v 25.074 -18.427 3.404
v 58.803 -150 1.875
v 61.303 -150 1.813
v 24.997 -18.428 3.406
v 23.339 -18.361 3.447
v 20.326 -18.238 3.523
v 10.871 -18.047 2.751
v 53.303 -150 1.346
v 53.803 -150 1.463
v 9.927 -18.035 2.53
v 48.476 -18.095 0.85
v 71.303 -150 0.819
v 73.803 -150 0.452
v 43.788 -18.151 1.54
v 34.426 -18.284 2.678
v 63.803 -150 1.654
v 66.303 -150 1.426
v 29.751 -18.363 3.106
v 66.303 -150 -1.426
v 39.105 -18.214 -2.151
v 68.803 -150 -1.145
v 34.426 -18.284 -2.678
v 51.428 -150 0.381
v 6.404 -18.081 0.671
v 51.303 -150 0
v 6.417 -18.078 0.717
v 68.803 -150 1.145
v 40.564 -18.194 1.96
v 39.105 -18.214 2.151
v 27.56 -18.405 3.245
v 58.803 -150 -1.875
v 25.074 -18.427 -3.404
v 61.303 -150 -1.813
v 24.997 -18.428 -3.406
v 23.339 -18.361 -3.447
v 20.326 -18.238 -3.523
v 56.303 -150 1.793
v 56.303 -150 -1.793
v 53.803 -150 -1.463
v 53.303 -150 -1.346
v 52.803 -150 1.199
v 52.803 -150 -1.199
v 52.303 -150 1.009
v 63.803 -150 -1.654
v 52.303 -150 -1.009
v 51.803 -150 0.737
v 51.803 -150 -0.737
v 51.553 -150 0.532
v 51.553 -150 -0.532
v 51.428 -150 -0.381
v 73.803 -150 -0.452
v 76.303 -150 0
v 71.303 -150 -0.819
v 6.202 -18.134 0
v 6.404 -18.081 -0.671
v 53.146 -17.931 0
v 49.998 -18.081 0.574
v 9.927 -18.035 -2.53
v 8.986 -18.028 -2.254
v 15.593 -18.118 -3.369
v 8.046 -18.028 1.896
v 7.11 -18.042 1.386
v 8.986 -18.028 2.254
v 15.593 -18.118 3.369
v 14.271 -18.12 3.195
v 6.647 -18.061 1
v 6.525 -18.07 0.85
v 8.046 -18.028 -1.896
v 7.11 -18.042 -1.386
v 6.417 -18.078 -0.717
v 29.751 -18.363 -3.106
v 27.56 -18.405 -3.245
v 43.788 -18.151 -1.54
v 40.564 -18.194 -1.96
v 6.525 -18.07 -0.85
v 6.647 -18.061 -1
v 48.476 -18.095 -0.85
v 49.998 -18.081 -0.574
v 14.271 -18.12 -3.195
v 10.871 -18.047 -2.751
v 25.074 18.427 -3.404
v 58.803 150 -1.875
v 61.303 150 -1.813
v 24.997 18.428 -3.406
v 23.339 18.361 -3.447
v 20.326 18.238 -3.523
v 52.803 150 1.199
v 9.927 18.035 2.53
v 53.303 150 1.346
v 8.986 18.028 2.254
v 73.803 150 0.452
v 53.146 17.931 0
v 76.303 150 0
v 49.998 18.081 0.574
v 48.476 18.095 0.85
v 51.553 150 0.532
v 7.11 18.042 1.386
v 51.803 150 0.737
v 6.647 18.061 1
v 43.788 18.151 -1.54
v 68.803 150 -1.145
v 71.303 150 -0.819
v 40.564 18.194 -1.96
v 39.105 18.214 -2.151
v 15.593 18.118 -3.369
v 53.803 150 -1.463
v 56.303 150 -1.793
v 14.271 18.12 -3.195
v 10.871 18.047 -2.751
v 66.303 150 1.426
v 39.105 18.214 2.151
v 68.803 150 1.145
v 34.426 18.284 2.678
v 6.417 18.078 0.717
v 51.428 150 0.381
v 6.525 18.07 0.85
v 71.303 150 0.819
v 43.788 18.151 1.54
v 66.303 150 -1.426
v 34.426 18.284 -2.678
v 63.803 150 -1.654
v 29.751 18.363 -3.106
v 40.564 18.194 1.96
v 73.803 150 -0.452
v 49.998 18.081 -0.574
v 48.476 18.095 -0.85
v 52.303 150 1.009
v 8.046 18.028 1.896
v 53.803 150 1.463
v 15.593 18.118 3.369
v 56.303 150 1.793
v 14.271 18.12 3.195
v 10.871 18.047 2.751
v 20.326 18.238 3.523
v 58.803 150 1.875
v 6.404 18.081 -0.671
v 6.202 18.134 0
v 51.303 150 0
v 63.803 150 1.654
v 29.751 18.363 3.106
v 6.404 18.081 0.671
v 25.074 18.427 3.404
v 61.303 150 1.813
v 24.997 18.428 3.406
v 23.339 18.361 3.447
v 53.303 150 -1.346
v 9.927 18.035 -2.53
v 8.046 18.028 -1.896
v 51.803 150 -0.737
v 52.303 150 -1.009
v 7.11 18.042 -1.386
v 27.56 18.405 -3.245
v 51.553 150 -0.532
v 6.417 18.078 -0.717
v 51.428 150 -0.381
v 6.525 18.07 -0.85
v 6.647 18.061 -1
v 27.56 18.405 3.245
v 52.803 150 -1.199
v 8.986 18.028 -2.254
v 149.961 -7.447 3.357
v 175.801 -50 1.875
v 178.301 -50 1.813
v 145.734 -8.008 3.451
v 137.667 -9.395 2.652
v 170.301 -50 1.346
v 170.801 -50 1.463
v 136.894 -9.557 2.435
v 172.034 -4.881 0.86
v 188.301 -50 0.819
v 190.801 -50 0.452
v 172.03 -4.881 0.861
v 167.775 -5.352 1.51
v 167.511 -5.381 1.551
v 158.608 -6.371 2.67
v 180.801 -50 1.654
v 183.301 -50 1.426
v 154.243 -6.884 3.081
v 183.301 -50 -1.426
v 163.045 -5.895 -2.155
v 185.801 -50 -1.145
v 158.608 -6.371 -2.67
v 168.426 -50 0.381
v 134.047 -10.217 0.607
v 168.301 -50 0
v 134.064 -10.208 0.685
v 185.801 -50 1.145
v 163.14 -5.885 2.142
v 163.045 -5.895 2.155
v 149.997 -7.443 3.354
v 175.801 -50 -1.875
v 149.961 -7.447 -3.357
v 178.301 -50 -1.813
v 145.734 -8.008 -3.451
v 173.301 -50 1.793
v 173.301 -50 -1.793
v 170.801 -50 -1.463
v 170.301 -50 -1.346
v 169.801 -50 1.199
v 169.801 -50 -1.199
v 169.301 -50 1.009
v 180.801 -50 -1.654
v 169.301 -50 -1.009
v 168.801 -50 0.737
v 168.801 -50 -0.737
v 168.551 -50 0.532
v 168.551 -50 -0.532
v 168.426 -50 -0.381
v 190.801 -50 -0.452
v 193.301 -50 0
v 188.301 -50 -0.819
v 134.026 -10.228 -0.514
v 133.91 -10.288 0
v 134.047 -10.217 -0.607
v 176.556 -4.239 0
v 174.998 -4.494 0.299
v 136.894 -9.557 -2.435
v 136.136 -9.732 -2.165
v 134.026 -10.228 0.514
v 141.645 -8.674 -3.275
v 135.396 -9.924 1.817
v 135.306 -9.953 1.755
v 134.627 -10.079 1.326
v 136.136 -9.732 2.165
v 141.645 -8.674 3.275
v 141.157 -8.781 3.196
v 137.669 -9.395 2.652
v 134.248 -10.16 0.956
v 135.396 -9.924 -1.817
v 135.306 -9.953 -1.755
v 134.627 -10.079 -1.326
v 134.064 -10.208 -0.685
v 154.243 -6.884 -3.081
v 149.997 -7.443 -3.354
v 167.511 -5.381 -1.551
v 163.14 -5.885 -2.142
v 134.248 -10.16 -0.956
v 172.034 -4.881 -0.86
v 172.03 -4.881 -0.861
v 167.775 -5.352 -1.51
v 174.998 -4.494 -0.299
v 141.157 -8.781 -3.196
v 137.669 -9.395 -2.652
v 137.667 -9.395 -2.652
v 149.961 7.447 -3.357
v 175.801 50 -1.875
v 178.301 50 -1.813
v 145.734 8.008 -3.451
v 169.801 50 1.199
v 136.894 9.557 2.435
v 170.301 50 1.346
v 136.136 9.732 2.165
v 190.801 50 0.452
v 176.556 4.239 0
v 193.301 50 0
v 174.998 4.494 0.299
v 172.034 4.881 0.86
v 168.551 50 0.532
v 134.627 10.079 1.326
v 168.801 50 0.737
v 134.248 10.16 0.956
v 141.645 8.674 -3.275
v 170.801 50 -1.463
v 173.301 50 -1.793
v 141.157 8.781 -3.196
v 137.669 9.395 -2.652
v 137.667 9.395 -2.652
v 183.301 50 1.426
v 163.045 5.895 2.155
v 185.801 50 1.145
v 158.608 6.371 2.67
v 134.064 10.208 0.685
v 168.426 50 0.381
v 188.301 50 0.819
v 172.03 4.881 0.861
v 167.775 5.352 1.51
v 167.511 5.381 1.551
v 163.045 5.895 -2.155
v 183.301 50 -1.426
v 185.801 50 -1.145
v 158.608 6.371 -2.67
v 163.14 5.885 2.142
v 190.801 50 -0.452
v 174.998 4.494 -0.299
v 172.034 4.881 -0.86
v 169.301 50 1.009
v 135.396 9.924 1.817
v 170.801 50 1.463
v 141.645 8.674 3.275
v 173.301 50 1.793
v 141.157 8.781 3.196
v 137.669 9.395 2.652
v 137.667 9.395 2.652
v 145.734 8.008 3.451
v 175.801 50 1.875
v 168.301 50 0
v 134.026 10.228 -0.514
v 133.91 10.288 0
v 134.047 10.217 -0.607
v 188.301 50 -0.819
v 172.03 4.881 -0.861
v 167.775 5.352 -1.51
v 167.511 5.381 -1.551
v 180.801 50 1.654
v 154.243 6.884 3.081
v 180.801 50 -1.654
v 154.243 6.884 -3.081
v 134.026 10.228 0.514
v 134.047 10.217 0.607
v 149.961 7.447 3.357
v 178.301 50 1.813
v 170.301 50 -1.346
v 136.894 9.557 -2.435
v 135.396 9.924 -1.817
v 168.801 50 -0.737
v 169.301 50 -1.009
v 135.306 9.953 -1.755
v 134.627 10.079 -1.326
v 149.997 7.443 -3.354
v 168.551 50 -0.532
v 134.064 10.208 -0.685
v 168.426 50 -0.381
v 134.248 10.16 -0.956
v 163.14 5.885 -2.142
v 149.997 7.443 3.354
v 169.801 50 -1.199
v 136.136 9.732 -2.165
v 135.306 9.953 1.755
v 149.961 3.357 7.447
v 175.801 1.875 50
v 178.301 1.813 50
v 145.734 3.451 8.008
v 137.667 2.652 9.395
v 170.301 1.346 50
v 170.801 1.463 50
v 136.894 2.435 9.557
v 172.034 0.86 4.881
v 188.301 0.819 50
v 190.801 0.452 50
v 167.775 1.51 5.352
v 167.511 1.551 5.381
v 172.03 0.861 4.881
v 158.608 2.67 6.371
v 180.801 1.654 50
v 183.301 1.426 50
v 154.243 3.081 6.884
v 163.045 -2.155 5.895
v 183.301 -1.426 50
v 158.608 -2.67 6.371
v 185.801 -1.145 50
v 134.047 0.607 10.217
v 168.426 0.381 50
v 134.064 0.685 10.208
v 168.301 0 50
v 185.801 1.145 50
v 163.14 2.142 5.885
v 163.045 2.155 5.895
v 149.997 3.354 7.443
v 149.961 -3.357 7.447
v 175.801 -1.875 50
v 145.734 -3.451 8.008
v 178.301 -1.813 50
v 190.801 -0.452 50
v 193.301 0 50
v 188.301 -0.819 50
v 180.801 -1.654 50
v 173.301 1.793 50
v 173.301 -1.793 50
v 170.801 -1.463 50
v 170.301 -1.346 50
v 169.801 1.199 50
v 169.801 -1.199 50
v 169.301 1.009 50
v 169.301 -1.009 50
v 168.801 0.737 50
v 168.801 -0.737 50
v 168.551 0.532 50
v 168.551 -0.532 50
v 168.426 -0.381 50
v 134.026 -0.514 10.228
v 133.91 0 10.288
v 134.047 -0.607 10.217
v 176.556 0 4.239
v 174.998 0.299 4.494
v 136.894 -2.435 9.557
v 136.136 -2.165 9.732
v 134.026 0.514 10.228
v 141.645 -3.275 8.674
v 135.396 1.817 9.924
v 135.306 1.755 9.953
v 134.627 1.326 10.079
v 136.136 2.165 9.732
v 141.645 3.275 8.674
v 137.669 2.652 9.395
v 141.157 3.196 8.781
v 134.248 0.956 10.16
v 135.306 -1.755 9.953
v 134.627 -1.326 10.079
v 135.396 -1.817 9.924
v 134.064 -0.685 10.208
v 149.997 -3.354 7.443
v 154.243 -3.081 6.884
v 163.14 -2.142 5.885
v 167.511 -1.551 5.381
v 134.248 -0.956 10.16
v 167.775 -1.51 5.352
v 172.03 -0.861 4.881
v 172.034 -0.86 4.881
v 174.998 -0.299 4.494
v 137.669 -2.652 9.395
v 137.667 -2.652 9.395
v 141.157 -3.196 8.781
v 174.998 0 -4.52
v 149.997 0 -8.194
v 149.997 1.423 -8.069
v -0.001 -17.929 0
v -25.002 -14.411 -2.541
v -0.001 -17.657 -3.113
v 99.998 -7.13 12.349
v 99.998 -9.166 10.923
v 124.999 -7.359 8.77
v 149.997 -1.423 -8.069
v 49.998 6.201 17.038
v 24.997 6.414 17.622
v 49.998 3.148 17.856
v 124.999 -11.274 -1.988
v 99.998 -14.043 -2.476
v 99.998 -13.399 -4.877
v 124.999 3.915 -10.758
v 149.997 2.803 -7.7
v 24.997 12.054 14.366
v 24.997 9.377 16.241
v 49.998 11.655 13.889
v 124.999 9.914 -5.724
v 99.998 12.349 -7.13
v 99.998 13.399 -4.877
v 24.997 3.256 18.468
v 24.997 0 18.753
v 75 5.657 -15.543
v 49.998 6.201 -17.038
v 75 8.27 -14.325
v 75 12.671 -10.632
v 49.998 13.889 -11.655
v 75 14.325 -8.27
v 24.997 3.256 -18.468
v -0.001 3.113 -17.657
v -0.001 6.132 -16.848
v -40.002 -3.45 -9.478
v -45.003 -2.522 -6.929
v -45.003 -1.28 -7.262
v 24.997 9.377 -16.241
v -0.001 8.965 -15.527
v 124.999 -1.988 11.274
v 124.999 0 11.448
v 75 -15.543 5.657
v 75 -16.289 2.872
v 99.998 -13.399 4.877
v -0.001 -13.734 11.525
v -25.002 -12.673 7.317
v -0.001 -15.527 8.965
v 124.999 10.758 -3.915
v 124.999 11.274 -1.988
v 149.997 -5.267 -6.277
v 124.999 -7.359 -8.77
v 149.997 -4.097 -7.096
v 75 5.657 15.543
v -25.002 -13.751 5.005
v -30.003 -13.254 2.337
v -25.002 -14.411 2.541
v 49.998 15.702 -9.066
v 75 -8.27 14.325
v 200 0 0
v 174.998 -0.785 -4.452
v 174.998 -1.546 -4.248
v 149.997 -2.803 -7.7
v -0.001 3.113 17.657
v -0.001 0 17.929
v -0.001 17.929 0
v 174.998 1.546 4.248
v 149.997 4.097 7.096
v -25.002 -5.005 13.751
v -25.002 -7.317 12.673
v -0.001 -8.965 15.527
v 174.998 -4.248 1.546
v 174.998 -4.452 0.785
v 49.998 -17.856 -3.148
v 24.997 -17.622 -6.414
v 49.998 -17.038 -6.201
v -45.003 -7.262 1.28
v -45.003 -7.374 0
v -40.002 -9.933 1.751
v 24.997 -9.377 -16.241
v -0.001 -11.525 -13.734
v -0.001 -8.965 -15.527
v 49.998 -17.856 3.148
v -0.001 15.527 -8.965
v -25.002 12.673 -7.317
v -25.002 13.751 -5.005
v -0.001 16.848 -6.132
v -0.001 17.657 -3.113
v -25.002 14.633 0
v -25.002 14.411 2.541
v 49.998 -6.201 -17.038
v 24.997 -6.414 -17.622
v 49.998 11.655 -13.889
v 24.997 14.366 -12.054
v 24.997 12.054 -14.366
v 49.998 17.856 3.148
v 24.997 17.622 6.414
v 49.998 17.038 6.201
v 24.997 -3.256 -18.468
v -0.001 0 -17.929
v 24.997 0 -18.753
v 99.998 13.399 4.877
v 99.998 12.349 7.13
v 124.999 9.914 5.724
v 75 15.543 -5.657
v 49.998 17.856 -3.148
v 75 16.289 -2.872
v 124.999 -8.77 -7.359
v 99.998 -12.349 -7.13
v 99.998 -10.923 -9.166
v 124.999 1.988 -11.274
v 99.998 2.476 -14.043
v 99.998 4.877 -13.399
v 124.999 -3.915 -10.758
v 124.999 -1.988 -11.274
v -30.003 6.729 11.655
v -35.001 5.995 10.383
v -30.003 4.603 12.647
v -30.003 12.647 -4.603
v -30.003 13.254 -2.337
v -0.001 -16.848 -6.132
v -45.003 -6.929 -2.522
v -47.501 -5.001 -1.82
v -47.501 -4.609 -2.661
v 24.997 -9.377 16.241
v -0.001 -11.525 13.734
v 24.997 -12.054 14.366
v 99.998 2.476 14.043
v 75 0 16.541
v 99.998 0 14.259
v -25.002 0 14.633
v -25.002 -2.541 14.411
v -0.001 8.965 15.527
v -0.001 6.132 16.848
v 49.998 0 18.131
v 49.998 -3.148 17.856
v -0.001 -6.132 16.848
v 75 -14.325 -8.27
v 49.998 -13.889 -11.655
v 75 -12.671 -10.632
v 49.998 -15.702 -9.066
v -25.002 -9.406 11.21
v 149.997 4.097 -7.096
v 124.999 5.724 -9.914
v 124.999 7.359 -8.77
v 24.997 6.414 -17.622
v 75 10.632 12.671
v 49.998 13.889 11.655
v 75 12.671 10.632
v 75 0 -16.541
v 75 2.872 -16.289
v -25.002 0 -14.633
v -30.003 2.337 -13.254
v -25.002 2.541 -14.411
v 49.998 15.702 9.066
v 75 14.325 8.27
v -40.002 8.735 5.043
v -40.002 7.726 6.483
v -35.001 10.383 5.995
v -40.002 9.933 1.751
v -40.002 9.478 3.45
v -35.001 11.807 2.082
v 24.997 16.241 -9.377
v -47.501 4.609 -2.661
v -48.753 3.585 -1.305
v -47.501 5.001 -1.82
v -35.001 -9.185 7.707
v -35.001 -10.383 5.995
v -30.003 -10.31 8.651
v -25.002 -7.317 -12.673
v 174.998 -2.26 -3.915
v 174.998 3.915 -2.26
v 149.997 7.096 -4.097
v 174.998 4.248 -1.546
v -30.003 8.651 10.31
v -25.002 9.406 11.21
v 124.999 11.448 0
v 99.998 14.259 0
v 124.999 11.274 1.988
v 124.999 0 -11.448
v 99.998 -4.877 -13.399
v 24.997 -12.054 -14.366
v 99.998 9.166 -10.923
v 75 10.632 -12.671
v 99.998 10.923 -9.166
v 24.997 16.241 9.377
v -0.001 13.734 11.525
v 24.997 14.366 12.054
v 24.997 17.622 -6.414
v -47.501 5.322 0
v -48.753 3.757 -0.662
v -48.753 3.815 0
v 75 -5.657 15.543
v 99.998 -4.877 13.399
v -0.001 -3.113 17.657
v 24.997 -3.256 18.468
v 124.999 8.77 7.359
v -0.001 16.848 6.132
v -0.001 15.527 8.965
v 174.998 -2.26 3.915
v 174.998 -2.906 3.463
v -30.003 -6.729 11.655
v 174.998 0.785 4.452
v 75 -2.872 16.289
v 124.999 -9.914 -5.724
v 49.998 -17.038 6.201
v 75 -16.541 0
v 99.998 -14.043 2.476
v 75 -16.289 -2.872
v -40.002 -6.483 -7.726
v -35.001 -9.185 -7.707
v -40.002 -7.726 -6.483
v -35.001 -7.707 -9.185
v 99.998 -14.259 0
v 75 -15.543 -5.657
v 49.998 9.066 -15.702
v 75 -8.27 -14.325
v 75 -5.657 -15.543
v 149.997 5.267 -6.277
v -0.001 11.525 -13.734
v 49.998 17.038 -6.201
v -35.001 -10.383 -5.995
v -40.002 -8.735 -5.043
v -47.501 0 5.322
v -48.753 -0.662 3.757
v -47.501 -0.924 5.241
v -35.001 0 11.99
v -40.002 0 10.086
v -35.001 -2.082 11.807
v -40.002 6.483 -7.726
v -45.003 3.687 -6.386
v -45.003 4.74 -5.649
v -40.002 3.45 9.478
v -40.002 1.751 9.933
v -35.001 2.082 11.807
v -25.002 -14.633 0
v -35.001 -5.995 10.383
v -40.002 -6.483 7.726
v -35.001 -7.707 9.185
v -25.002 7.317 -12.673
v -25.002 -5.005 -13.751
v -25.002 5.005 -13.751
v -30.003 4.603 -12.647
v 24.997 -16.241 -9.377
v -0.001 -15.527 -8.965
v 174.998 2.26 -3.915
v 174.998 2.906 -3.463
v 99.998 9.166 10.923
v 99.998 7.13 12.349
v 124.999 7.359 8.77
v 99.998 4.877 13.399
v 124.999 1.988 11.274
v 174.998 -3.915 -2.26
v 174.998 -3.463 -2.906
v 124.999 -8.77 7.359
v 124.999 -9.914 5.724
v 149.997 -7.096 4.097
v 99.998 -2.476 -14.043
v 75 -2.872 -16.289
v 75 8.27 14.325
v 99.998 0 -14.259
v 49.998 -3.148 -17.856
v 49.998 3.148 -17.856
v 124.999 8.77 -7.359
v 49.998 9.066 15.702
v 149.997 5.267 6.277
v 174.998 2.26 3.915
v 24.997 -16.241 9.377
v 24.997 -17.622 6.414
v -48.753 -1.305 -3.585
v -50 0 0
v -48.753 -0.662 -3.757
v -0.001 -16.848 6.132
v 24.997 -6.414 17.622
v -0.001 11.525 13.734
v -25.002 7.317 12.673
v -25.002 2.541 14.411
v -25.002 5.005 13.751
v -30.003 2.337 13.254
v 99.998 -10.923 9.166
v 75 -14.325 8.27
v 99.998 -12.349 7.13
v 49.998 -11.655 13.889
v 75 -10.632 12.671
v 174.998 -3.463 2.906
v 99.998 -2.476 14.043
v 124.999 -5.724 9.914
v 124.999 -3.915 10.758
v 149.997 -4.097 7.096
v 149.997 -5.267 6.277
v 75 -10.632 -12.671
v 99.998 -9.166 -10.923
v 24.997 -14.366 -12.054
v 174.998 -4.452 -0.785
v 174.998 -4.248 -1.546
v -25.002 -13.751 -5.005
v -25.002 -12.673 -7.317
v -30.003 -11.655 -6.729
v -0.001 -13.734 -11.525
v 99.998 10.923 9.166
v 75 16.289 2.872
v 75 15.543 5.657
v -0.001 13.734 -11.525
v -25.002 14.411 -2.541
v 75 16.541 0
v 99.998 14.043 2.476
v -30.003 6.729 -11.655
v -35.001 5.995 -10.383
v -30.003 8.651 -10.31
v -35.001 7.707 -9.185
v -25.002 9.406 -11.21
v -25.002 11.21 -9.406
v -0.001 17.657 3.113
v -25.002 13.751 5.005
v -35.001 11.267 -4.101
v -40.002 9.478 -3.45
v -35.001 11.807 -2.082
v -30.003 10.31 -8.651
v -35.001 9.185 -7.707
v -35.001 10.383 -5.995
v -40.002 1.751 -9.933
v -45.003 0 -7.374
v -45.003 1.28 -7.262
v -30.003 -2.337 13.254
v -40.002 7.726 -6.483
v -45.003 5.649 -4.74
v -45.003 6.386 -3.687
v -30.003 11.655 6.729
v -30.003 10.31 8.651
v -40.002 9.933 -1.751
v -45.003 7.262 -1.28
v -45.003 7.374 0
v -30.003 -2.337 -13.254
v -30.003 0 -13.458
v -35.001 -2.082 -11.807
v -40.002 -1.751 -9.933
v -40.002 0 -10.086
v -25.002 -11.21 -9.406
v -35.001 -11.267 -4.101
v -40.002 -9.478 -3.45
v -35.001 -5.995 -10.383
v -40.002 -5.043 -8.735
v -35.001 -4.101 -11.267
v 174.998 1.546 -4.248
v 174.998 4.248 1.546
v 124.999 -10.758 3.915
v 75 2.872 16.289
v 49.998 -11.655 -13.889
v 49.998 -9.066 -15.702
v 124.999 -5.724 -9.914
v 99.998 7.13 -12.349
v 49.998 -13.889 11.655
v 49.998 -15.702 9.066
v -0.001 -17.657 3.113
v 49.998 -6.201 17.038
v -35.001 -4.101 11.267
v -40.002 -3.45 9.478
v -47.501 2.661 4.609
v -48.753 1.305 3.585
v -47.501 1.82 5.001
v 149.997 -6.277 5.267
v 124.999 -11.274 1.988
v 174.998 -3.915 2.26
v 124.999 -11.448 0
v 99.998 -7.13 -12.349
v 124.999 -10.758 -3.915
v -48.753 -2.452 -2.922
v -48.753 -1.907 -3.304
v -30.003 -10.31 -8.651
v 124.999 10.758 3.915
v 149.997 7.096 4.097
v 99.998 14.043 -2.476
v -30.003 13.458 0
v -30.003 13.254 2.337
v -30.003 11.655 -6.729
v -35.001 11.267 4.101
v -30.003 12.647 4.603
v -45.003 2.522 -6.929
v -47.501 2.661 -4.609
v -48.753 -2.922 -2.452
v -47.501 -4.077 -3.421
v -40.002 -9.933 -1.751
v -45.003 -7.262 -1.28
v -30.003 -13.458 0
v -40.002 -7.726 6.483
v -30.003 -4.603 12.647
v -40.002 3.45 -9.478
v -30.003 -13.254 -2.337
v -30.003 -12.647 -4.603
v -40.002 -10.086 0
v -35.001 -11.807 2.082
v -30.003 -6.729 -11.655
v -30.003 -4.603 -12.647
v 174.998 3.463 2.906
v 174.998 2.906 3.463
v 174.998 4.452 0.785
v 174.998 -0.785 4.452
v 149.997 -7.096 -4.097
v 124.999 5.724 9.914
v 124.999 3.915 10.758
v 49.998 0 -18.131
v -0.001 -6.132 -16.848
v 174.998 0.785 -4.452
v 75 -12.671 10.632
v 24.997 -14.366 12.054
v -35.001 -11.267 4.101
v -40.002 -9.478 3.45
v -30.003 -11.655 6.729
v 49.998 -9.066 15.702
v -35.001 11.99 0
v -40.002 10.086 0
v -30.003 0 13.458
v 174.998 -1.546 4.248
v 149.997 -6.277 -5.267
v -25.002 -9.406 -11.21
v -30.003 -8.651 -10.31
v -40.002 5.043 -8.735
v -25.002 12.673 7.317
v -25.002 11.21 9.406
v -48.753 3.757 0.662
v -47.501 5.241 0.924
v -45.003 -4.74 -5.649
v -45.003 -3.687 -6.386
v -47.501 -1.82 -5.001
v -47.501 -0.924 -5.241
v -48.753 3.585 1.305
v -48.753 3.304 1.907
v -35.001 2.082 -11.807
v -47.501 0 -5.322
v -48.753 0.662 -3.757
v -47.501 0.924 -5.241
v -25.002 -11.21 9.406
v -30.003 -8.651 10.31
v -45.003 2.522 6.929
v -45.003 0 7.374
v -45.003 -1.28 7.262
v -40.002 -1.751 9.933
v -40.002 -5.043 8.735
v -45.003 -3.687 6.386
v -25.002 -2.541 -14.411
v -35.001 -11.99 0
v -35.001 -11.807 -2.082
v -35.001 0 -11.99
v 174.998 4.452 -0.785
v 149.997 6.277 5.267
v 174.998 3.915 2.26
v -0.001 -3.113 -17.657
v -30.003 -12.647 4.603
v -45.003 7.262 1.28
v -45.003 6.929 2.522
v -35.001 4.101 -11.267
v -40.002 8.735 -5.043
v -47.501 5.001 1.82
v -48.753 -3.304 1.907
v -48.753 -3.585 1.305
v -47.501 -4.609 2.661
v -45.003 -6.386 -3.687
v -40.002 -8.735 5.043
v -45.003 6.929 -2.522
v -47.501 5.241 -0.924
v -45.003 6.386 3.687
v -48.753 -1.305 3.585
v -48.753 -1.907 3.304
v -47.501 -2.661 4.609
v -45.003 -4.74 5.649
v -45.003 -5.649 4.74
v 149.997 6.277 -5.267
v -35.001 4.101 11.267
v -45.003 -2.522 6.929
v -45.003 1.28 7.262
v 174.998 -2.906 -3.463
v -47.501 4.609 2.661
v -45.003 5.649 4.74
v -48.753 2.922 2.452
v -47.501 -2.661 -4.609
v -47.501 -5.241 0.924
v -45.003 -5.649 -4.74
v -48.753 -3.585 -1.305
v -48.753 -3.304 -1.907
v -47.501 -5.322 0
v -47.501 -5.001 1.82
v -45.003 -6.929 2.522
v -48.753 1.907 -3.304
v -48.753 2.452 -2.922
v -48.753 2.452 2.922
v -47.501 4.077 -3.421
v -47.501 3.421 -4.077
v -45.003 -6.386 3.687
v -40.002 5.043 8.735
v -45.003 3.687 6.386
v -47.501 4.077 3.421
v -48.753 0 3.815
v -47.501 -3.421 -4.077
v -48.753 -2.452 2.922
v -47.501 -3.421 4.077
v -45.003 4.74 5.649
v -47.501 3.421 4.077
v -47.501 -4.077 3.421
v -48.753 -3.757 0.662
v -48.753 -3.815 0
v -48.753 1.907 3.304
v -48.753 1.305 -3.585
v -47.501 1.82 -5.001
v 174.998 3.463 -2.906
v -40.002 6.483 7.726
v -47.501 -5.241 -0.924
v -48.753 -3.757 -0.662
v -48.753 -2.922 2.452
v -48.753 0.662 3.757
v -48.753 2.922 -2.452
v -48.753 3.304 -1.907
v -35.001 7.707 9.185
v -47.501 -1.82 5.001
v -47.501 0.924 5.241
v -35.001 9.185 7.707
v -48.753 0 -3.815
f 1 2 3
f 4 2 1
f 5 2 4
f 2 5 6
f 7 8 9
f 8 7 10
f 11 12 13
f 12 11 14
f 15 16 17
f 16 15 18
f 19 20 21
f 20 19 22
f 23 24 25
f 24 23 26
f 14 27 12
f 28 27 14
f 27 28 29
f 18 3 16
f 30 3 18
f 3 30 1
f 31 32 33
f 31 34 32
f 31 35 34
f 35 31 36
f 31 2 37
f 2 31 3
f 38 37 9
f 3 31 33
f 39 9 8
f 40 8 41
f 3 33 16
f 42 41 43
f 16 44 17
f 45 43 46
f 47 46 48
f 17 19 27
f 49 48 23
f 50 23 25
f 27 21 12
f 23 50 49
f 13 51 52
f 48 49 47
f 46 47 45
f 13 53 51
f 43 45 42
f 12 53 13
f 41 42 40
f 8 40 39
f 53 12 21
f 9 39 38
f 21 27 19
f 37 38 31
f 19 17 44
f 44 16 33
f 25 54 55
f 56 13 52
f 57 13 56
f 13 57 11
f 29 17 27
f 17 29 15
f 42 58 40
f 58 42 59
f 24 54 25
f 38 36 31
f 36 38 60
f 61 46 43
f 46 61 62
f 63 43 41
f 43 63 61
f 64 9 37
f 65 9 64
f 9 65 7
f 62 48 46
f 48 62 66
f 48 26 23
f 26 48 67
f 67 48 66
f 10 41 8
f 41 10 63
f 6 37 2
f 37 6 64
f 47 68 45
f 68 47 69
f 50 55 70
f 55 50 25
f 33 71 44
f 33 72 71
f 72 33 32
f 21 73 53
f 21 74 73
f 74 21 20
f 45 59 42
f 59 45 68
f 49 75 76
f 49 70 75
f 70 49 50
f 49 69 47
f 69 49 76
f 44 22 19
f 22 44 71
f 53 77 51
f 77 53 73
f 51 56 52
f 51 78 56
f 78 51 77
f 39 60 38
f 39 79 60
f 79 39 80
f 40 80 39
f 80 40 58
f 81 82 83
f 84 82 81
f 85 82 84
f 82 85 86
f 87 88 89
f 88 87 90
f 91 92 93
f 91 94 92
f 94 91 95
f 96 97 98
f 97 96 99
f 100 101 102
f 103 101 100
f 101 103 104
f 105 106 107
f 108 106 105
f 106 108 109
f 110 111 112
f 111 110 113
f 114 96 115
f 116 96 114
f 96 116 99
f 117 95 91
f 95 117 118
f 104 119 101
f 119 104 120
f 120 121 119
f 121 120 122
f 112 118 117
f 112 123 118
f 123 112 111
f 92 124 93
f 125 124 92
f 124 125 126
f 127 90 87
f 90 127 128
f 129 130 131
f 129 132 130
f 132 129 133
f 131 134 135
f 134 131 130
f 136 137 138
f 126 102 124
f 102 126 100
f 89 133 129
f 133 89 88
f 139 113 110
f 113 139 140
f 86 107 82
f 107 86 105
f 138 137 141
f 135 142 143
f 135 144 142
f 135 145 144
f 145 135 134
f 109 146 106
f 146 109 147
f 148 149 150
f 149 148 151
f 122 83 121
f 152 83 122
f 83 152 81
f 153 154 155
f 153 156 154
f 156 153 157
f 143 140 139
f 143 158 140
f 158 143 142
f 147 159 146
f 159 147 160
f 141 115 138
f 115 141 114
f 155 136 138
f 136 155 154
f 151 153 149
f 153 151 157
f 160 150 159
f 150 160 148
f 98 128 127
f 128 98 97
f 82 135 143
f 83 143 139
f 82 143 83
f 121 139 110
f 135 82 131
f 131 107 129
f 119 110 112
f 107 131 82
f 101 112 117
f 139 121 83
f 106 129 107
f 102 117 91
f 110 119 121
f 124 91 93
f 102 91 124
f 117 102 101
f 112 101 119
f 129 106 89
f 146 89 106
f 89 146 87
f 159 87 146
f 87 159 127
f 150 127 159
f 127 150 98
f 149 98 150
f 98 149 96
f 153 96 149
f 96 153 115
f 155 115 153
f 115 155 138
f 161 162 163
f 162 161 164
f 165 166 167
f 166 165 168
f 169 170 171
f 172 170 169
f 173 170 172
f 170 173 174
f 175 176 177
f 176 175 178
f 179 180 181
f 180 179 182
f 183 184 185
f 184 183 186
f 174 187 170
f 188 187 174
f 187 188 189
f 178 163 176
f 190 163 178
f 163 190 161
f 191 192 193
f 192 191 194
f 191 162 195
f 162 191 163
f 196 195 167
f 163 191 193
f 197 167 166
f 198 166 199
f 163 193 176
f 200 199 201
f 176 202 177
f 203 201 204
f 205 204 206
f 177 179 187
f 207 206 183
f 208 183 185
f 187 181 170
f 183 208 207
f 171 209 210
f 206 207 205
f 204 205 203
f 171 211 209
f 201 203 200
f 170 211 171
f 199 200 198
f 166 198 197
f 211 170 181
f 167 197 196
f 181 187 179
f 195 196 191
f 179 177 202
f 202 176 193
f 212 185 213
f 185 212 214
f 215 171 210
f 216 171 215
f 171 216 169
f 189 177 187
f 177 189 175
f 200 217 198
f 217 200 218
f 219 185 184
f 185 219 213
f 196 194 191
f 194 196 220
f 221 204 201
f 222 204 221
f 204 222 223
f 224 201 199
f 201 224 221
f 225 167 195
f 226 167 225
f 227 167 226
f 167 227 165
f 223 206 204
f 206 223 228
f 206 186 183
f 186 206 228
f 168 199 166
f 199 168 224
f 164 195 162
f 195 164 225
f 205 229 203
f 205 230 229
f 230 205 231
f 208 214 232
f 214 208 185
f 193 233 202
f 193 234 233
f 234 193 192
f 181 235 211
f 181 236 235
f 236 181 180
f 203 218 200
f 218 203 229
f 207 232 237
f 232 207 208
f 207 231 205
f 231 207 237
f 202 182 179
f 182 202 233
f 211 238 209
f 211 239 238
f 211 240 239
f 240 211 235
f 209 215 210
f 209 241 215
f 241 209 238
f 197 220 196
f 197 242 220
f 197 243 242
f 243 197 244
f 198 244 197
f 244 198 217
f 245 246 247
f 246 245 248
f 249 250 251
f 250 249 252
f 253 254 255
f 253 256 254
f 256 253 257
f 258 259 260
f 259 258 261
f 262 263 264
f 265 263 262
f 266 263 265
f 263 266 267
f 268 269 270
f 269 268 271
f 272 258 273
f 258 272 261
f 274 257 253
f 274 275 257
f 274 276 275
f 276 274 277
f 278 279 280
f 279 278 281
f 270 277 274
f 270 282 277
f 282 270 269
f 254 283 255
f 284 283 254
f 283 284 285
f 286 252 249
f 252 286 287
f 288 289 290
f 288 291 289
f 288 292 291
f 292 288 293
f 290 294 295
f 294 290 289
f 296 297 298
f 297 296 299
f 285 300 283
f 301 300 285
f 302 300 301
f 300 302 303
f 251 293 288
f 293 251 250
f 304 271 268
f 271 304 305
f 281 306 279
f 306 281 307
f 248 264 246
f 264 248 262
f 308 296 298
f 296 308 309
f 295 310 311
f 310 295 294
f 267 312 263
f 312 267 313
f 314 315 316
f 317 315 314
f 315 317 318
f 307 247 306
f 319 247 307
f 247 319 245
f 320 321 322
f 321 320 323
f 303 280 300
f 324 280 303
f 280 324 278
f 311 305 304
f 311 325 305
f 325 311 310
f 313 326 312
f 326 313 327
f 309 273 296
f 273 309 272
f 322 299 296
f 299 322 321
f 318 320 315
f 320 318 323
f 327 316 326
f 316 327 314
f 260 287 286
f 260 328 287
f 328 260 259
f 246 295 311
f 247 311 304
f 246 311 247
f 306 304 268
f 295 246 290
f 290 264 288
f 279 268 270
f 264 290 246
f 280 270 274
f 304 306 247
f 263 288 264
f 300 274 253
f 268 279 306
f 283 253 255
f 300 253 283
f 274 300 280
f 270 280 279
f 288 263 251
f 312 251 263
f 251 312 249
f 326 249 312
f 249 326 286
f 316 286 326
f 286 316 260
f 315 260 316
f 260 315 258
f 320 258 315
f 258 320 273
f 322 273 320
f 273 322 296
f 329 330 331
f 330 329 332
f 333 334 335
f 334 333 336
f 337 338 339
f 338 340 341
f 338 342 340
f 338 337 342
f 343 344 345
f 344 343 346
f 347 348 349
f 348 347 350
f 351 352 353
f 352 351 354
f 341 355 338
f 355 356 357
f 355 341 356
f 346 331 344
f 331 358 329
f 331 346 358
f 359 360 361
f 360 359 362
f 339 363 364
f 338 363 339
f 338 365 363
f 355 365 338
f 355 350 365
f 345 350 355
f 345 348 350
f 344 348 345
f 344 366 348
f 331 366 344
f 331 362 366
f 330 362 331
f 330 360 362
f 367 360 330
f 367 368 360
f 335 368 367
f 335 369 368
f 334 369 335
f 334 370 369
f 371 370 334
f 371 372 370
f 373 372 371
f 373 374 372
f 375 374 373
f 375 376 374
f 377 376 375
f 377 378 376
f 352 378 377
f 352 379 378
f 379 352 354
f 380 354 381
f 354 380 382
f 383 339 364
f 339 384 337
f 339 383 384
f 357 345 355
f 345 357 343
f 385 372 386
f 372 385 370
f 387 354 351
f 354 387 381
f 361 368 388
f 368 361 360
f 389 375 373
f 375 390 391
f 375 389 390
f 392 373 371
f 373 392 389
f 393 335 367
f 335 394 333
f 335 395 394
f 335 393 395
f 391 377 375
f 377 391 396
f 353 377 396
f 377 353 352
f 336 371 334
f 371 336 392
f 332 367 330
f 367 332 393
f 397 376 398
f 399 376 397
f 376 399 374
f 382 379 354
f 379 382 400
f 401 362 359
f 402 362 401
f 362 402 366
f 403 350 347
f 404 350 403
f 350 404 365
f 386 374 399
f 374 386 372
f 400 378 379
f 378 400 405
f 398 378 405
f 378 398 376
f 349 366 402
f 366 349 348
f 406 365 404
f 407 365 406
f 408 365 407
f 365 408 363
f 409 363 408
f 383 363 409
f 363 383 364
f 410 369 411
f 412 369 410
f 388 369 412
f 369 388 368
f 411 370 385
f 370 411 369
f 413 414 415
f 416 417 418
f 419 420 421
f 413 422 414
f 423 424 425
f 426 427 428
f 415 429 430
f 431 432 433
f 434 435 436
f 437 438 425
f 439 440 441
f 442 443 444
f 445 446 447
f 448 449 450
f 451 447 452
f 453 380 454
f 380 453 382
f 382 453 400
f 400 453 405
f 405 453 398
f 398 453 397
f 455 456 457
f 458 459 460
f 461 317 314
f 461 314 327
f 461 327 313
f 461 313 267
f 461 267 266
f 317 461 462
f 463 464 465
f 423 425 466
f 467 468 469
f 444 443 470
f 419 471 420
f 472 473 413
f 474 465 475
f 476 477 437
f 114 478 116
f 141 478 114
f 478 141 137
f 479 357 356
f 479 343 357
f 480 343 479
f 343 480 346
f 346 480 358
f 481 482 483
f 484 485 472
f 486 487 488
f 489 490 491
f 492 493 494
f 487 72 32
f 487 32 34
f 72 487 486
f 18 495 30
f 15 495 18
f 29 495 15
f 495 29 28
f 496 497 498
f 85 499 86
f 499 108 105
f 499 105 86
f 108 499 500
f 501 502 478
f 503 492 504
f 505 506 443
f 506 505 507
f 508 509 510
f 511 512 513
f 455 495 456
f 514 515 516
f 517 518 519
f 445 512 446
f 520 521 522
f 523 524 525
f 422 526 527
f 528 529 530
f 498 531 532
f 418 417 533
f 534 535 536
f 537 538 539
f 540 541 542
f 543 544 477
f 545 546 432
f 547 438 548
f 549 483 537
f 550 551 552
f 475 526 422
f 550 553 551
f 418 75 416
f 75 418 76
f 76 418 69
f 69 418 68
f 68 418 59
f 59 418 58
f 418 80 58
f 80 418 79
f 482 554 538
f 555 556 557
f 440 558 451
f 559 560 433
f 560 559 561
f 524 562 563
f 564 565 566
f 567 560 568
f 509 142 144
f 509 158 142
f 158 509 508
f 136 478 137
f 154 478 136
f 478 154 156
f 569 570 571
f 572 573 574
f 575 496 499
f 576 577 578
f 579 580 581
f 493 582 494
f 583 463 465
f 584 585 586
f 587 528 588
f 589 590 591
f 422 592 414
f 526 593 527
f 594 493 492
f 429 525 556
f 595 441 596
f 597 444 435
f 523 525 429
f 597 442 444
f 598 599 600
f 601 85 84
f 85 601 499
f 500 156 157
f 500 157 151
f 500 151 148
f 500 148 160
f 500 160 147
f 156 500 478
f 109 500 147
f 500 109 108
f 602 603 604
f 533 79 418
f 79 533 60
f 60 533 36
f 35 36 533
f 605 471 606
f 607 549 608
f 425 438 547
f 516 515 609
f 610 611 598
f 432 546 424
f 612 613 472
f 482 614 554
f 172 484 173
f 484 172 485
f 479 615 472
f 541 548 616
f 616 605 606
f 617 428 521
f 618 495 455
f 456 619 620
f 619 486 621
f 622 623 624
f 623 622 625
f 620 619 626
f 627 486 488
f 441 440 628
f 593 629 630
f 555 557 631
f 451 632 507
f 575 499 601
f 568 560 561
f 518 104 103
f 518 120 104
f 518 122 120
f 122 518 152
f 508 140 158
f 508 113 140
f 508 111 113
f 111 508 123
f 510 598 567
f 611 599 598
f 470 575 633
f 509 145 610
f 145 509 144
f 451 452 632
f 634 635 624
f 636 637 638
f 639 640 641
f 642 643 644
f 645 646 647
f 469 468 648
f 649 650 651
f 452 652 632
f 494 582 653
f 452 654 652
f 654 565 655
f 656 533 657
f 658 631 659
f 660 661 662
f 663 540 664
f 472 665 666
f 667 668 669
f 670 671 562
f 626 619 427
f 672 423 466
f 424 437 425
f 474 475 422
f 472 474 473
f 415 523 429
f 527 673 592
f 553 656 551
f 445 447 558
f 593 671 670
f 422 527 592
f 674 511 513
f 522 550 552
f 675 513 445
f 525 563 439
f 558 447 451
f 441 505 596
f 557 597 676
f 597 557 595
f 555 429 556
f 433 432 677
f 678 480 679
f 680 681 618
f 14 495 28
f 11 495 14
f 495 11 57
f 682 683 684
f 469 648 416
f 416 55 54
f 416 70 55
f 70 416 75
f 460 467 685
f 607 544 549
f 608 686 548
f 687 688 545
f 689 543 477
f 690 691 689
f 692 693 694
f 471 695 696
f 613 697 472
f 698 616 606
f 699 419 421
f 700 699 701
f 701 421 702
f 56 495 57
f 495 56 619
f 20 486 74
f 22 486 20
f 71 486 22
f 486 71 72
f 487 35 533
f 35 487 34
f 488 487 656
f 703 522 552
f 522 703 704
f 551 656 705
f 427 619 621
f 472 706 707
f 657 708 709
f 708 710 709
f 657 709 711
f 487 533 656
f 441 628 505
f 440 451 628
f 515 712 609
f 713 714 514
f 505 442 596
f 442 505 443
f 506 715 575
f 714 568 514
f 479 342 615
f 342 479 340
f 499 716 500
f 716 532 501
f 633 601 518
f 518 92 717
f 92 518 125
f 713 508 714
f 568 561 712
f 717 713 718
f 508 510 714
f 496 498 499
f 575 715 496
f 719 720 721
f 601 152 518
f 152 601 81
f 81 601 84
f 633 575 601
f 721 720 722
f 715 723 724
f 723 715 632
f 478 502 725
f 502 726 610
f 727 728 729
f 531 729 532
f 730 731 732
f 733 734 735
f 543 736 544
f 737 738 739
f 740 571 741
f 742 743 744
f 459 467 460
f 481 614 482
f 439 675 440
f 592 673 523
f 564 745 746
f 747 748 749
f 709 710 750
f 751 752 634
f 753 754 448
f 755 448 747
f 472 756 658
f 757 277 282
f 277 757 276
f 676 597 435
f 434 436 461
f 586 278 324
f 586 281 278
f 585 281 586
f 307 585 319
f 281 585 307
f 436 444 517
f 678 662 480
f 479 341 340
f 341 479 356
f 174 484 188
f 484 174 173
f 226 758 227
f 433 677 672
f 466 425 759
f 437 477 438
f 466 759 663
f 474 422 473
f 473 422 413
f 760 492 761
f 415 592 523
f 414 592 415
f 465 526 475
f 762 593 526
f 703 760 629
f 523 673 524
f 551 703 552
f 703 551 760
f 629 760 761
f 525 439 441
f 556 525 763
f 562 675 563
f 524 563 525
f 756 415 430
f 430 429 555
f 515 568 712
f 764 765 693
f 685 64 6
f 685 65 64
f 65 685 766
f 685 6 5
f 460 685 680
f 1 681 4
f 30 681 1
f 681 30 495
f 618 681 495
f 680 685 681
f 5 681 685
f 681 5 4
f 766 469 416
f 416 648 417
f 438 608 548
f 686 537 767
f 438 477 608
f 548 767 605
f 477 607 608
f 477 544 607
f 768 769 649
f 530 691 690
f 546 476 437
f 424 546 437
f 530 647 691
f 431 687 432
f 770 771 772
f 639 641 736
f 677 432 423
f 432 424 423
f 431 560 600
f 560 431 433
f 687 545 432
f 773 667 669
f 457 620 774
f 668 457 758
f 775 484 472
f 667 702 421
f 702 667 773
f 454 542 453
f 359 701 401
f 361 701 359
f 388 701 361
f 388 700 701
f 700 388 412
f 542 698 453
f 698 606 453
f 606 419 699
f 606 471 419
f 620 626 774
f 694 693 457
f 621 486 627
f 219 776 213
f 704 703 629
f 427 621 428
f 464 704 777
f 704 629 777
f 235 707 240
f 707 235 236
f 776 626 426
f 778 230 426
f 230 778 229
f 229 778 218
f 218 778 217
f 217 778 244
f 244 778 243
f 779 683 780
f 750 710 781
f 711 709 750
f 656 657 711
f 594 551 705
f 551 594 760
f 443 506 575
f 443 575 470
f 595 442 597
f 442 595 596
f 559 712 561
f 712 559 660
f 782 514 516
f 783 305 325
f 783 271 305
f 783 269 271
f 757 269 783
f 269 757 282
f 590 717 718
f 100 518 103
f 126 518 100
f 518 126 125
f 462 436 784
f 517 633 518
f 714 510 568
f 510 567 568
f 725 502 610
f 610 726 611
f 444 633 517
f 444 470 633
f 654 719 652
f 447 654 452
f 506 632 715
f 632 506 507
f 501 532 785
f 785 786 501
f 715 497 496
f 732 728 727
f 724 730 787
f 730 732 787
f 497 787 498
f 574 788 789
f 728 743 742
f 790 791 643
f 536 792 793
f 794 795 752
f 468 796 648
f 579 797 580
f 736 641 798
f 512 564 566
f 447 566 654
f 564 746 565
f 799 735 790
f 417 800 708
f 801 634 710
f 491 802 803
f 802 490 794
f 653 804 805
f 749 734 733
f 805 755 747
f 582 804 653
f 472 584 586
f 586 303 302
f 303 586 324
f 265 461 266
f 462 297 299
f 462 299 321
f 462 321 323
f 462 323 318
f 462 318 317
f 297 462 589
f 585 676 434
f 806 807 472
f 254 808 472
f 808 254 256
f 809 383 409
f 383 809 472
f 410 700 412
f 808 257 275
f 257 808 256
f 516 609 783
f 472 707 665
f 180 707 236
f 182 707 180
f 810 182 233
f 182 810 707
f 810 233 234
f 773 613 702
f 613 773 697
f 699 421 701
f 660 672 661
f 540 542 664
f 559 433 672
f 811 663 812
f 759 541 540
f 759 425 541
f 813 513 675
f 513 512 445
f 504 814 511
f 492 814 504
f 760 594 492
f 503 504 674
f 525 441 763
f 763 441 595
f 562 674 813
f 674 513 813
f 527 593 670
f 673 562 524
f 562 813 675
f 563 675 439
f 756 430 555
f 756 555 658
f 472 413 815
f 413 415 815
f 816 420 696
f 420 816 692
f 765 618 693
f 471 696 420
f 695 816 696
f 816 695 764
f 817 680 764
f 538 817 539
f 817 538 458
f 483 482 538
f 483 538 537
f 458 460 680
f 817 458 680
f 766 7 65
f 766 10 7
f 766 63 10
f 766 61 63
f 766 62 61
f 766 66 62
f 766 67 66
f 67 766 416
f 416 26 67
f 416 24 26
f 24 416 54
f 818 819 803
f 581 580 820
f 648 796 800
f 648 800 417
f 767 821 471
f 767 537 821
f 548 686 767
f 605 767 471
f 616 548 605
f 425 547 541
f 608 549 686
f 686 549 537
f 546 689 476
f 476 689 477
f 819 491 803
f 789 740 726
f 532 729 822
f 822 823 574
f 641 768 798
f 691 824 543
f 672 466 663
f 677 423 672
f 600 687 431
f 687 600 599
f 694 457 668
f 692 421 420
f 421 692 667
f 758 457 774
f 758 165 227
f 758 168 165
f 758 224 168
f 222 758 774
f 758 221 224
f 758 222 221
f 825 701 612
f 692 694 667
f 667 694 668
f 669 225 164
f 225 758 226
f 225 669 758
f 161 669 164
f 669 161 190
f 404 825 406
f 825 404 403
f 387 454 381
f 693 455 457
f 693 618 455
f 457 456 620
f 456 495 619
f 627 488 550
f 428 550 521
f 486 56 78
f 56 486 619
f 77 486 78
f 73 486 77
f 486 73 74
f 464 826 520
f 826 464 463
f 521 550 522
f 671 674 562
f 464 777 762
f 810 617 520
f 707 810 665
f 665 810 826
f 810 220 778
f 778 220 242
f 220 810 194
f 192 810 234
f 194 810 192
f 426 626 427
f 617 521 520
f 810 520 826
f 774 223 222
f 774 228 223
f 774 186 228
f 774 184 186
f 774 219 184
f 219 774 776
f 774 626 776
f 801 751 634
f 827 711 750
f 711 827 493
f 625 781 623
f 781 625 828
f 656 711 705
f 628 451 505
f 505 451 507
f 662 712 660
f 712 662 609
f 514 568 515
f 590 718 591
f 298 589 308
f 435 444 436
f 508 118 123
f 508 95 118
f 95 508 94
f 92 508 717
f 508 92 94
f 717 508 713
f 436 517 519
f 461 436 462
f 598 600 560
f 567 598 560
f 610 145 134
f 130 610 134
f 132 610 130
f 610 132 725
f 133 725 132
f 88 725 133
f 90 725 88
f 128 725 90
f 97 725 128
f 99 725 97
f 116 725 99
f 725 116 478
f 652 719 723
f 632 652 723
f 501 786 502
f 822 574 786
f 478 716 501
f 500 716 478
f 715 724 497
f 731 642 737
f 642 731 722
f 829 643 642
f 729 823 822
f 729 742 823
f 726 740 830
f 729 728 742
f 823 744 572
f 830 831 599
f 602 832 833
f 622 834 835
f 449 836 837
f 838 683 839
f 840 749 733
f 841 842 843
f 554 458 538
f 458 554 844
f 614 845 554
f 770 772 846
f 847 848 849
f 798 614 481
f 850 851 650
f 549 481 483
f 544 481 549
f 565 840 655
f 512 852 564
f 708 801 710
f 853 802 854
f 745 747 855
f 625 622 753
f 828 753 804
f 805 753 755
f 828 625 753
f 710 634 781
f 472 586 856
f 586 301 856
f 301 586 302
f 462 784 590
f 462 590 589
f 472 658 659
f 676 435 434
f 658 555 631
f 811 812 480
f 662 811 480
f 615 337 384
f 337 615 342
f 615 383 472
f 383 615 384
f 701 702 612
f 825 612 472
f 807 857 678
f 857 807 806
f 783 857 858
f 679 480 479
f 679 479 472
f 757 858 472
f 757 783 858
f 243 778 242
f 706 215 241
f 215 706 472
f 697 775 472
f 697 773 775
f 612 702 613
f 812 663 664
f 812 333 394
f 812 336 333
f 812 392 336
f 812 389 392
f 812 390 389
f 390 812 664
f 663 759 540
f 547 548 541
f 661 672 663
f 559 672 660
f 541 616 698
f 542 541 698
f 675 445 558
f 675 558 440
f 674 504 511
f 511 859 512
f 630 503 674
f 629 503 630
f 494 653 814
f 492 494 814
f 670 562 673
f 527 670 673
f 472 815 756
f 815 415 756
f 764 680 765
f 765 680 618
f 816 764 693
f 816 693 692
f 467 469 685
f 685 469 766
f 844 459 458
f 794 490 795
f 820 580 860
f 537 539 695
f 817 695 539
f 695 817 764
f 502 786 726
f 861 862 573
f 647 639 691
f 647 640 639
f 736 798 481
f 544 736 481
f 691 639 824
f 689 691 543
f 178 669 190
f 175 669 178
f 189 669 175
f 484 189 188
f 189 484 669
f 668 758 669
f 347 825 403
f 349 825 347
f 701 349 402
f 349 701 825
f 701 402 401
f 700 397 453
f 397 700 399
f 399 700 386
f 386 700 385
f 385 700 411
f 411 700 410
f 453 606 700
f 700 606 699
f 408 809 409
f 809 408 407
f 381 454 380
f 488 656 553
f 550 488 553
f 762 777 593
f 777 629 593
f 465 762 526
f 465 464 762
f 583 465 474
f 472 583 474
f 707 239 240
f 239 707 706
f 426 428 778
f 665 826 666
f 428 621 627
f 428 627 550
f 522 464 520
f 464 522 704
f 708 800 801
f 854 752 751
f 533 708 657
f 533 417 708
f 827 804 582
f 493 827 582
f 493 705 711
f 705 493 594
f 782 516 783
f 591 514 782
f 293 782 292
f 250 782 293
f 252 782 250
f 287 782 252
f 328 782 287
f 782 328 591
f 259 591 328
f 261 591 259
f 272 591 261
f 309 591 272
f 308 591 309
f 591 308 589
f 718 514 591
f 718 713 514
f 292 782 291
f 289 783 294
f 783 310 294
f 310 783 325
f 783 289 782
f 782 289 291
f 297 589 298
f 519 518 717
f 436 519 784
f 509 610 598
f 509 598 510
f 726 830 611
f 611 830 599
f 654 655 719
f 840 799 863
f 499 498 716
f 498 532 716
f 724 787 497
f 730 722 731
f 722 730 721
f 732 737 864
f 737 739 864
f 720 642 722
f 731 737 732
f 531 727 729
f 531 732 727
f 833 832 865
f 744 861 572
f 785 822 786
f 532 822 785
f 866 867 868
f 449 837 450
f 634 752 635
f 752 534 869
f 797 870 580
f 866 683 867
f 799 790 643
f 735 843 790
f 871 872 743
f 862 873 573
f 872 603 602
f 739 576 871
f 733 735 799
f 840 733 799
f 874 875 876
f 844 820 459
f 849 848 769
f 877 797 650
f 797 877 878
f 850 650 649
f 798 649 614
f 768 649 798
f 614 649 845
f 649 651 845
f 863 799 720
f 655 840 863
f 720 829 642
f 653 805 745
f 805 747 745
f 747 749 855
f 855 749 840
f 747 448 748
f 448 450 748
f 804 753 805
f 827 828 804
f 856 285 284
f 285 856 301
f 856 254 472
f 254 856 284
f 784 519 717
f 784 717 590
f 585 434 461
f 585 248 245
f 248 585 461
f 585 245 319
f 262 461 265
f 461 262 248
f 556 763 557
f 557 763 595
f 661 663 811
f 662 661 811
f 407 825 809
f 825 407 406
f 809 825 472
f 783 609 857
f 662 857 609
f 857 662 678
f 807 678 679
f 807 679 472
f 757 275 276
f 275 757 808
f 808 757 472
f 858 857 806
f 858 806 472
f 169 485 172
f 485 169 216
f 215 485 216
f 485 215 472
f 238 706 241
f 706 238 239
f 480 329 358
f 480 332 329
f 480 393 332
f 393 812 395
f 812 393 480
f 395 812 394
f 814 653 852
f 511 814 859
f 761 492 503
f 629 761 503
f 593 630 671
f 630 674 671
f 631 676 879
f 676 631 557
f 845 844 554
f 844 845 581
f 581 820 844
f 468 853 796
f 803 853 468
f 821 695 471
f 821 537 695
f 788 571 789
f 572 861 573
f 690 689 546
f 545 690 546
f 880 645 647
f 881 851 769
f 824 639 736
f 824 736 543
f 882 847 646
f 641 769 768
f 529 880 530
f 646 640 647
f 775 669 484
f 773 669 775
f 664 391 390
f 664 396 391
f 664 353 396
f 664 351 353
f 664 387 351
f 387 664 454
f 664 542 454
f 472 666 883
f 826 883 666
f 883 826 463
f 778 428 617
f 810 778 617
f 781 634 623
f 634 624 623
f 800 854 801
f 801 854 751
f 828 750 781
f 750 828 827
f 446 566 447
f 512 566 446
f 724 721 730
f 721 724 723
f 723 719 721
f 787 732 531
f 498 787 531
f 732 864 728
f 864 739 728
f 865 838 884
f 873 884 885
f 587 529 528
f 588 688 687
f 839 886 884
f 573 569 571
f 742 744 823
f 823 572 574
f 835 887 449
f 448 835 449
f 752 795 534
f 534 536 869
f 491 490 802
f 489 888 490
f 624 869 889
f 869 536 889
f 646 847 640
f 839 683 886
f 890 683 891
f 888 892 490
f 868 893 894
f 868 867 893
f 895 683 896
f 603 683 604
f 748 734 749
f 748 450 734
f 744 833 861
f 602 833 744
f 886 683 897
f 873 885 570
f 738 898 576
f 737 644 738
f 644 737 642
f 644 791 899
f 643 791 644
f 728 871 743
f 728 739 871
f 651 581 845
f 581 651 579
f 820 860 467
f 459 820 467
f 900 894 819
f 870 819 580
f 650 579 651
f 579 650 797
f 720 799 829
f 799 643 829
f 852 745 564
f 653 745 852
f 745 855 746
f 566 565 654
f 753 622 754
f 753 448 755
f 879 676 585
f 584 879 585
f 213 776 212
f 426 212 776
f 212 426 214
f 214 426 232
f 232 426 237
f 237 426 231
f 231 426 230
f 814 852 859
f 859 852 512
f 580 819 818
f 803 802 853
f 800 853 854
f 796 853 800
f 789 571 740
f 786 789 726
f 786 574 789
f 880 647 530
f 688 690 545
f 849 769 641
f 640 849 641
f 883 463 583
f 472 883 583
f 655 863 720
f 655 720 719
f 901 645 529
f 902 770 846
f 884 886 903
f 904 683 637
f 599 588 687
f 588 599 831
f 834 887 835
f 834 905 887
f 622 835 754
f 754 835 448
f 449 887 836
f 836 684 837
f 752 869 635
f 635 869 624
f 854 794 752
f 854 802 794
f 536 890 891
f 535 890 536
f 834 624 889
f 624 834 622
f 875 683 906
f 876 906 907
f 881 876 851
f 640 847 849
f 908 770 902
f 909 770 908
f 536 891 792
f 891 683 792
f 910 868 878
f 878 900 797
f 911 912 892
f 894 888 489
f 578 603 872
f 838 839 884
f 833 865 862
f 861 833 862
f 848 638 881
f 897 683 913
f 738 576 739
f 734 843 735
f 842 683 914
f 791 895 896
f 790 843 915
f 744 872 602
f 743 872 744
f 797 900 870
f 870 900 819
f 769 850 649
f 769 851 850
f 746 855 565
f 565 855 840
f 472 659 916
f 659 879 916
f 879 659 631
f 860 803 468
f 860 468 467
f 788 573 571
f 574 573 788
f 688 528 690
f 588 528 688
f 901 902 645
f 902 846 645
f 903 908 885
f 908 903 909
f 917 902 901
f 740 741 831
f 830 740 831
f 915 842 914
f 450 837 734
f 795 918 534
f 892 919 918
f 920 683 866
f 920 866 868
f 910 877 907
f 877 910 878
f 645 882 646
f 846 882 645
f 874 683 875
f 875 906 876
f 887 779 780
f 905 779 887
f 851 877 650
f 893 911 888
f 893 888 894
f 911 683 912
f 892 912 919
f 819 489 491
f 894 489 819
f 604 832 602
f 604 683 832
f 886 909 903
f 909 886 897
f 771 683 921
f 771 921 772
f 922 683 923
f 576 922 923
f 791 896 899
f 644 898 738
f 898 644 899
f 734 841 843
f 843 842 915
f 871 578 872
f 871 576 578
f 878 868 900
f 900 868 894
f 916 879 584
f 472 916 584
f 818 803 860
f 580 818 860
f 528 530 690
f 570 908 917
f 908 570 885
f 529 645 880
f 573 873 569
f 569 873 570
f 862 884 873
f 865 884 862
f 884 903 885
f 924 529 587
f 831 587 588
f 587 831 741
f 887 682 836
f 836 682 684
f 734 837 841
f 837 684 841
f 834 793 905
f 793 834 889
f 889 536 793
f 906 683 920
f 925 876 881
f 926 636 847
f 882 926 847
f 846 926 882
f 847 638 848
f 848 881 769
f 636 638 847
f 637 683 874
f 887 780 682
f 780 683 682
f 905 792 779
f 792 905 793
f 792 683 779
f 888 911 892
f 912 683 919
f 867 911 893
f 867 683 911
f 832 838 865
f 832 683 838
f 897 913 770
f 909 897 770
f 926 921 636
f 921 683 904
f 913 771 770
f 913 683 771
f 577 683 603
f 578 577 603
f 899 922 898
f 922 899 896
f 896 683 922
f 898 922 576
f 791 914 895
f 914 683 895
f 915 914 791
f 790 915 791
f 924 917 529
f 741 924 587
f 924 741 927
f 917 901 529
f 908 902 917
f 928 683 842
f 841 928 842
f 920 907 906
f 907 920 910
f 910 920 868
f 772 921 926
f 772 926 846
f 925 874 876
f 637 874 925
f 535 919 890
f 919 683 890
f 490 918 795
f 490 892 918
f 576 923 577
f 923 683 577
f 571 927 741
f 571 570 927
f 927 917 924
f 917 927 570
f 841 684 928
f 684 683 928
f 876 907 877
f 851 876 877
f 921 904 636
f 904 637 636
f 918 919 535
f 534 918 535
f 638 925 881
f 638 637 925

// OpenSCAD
// Parametric NACA 00xx airfoil.
// See http://en.wikipedia.org/wiki/NACA_airfoil

// preview[view:south, tilt:top diagonal]

WINGS = 2; // [2:Dual Wings, 1:Single Wing]

// Wing chord (leading edge to trailing edge)
CHORD = 50;

// Wing length (root to tip)
LENGTH = 150;

// Max wing thickness (as percentage of chord length)
t = 15;

// Scale proportion of wing tip vs. wing root
TAPER = 0.5;

// Sweep back angle of wing
SWEEP_ANGLE = 20;

/* [Hidden] */
E = 0.01;

function y(x) = t / 20.0 *
         (.2969 * sqrt(x)
          -0.1260 * x
          -0.3516 * pow(x, 2)
          +0.2843 * pow(x, 3)
          -0.1015 * pow(x, 4));

// Argh!  No for loop initializer in open scad!
a = [[0.0, y(0.0)],
     [0.005, y(0.005)],
     [0.01, y(0.01)],
     [0.02, y(0.02)], [0.04, y(0.04)], [0.06, y(0.06)], [0.08, y(0.08)],
     [0.1, y(0.1)],
     [0.2, y(0.2)],
     [0.3, y(0.3)],
     [0.4, y(0.4)],
     [0.5, y(0.5)],
     [0.6, y(0.6)],
     [0.7, y(0.7)],
     [0.8, y(0.8)],
     [0.9, y(0.9)],
     [1.0, 0.0],
     [0.9, -y(0.9)],
     [0.8, -y(0.8)],
     [0.7, -y(0.7)],
     [0.6, -y(0.6)],
     [0.5, -y(0.5)],
     [0.4, -y(0.4)],
     [0.3, -y(0.3)],
     [0.2, -y(0.2)],
     [0.1, -y(0.1)],
     [0.08, -y(0.08)], [0.06, -y(0.06)], [0.04, -y(0.04)], [0.02, -y(0.02)],
     [0.01, -y(0.01)],
     [0.005, -y(0.005)],
     [0.0, -y(0.0)]
     ];

b = [[0.0, y(0.0)],
     [0.005, y(0.005)],
     [0.01, y(0.01)],
     [0.02, y(0.02)], [0.04, y(0.04)], [0.06, y(0.06)], [0.08, y(0.08)],
     [0.1, y(0.1)],
     [0.2, y(0.2)],
     [0.3, y(0.3)],
     [0.4, y(0.4)],
     [0.5, y(0.5)],
     [0.6, y(0.6)],
     [0.7, y(0.7)],
     [0.8, y(0.8)],
     [0.9, y(0.9)],
     [1.0, 0.0]];

module naca_2d(chord) {
  scale([chord, chord, 1])
    polygon(points=a);
}

module naca_25d(chord) {
  linear_extrude(height=E) naca_2d(chord);
}

module reflect_z() {
  multmatrix(m=[[1, 0, 0, 0],
                [0, 1, 0, 0],
                [0, 0, -1, 0],
                [0, 0, 0, 1]])
    child(0);
}

module naca(chord, length, taper=1, sweep_ang=0) {
  sweep = sin(sweep_ang);
  multmatrix(m=[ [1, 0, sweep, 0],
                 [0, 1, 0, 0],
                 [0, 0, 1, 0],
                 [0, 0, 0, 1]
               ])
   hull() {
     naca_25d(chord);
     translate([0, 0, length - E])
       scale([taper, taper, 1])
         naca_25d(chord);
  }
}

module body(chord) {
  rotate(-90, v=[0, 1, 0])
  rotate_extrude($fn=36)
    rotate(-90, v=[0, 0, 1])
      scale([chord, chord, 1])
        polygon(points=b);
}

module wing(chord, length, taper=1, sweep_ang=0) {
  rotate(90, v=[1, 0, 0])
  union() {
    naca(chord, length, taper, sweep_ang);
    reflect_z()
      naca(chord, length, taper, sweep_ang);
  }
}


translate([-CHORD, 0, 0])
  body(CHORD * 5);

wing(CHORD, LENGTH, TAPER, SWEEP_ANGLE);

translate([CHORD * 2.5, 0, 0]) union() {
  naca(CHORD, LENGTH / 3, TAPER, SWEEP_ANGLE * 3);
  wing(CHORD, LENGTH / 3, TAPER, SWEEP_ANGLE * 3);
}
